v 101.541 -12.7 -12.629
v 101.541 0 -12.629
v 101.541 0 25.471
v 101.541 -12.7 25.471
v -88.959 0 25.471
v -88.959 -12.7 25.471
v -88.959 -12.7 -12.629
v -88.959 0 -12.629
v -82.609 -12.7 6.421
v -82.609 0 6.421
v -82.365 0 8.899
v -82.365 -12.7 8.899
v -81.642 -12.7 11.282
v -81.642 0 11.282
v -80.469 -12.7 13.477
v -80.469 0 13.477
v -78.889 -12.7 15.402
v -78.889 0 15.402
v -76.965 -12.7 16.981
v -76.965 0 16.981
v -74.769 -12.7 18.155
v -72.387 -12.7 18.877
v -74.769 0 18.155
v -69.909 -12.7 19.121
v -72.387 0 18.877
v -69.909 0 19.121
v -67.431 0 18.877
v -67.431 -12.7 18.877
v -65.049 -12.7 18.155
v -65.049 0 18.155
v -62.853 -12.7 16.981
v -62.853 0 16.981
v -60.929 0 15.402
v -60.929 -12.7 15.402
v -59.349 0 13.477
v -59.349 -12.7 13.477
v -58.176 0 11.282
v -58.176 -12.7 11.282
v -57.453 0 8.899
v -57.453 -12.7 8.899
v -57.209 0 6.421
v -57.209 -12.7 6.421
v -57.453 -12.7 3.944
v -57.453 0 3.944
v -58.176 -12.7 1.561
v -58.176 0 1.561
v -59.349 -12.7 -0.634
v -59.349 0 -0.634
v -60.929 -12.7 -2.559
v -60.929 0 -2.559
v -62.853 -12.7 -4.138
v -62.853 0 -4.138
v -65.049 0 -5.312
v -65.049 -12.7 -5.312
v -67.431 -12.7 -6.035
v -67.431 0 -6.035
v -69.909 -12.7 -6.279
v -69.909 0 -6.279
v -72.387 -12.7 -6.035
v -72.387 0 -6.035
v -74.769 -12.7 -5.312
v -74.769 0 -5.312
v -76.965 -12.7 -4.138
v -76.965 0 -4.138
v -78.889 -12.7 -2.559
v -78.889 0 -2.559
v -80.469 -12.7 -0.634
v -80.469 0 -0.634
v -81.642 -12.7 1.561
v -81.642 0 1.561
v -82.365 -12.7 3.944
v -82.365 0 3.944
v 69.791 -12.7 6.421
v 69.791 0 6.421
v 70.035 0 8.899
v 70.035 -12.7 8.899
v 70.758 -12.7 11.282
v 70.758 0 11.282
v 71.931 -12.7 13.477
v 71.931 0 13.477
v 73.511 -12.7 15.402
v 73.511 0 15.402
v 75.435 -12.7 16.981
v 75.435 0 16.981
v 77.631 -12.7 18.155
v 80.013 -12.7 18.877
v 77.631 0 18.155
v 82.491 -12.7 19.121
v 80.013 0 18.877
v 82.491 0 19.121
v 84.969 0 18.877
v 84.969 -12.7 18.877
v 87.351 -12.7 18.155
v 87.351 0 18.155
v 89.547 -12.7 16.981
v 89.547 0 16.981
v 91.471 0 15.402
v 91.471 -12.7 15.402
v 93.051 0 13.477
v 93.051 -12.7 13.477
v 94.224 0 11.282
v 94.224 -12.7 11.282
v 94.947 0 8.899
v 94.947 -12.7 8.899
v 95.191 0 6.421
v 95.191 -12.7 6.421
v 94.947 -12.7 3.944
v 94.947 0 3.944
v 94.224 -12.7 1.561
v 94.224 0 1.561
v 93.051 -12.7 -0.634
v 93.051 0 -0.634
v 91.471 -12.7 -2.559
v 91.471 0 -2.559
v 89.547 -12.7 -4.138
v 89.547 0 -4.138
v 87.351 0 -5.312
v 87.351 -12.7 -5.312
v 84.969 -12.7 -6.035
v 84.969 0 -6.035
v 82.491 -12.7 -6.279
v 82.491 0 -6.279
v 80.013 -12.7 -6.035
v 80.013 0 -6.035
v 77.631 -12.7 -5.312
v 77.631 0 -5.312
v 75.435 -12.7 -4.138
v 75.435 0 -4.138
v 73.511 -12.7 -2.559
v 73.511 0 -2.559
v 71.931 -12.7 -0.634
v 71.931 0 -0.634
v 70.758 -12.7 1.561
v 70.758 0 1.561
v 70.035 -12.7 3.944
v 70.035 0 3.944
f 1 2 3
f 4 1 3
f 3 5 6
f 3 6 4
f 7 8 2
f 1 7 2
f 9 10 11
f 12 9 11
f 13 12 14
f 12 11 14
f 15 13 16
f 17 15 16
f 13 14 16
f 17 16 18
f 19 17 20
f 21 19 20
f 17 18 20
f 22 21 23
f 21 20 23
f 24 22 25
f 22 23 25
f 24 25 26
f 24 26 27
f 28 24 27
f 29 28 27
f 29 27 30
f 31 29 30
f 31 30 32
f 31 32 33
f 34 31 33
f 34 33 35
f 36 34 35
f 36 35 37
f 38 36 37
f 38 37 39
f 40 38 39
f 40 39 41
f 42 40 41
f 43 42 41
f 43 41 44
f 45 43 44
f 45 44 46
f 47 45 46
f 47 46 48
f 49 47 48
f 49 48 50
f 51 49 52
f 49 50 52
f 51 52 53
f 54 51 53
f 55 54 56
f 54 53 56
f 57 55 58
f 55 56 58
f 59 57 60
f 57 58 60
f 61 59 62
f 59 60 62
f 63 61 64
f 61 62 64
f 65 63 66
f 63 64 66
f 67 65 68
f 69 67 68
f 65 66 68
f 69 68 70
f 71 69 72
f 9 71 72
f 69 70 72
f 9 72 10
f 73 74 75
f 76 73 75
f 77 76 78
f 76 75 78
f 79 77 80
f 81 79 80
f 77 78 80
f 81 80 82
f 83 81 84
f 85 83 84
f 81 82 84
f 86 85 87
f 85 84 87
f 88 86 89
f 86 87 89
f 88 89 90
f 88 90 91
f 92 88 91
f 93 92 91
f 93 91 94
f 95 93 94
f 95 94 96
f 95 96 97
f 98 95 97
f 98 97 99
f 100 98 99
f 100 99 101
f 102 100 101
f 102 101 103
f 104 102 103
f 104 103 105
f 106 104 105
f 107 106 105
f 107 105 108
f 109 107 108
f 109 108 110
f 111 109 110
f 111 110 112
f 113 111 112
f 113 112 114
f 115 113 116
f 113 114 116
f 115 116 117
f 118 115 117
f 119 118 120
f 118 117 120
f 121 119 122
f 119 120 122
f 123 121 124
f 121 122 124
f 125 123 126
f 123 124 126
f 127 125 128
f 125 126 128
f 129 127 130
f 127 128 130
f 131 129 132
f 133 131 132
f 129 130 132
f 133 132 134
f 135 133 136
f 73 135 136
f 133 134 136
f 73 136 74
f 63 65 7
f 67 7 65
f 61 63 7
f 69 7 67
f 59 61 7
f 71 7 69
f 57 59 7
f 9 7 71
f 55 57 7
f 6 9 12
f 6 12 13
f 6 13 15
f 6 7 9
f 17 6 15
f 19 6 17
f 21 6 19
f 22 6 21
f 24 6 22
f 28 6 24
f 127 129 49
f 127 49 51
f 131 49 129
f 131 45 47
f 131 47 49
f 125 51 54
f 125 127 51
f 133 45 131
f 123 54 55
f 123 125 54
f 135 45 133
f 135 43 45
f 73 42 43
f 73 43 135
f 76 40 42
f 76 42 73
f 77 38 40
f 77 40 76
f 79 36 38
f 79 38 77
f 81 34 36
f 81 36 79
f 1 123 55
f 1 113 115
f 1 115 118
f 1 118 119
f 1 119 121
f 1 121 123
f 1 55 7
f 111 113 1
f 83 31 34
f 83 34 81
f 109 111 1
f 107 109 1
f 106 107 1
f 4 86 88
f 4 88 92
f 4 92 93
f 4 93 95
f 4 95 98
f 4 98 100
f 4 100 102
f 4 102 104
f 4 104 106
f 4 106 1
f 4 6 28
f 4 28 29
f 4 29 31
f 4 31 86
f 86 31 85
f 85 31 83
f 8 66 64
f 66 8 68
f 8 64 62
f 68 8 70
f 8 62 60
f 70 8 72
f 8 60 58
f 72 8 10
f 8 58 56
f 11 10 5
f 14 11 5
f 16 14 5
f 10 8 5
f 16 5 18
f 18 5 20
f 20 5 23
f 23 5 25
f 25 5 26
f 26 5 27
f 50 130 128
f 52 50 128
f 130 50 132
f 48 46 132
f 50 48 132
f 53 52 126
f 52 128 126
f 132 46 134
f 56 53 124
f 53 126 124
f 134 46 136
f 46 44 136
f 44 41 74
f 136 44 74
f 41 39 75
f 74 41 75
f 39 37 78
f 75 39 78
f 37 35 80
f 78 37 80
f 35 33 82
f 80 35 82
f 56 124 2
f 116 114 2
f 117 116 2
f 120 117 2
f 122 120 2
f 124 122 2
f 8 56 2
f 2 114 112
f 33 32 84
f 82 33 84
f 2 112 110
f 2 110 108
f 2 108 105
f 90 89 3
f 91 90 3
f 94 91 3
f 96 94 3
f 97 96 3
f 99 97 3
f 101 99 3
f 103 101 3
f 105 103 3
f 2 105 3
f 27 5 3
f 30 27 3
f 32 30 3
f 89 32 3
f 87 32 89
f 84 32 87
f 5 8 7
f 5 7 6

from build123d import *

# Parameters (mm, degrees)
F0_W     = 190.5
F0_H     = 38.1
F1_DEPTH = 12.7
F3_D     = 25.4


with BuildPart() as f1:
    # F0 (on Front) → F1 (new body)
    with BuildSketch(Plane.XZ):
        with Locations((6.291108, 6.421452)):
            Rectangle(F0_W, F0_H)
    extrude(amount=F1_DEPTH)

    # F3 (through all)
    with Locations(Plane.XZ.offset(12.7)):
        with Locations((-69.908892, 6.421452), (82.491108, 6.421452)):
            Hole(F3_D / 2)


solid = f1.part
